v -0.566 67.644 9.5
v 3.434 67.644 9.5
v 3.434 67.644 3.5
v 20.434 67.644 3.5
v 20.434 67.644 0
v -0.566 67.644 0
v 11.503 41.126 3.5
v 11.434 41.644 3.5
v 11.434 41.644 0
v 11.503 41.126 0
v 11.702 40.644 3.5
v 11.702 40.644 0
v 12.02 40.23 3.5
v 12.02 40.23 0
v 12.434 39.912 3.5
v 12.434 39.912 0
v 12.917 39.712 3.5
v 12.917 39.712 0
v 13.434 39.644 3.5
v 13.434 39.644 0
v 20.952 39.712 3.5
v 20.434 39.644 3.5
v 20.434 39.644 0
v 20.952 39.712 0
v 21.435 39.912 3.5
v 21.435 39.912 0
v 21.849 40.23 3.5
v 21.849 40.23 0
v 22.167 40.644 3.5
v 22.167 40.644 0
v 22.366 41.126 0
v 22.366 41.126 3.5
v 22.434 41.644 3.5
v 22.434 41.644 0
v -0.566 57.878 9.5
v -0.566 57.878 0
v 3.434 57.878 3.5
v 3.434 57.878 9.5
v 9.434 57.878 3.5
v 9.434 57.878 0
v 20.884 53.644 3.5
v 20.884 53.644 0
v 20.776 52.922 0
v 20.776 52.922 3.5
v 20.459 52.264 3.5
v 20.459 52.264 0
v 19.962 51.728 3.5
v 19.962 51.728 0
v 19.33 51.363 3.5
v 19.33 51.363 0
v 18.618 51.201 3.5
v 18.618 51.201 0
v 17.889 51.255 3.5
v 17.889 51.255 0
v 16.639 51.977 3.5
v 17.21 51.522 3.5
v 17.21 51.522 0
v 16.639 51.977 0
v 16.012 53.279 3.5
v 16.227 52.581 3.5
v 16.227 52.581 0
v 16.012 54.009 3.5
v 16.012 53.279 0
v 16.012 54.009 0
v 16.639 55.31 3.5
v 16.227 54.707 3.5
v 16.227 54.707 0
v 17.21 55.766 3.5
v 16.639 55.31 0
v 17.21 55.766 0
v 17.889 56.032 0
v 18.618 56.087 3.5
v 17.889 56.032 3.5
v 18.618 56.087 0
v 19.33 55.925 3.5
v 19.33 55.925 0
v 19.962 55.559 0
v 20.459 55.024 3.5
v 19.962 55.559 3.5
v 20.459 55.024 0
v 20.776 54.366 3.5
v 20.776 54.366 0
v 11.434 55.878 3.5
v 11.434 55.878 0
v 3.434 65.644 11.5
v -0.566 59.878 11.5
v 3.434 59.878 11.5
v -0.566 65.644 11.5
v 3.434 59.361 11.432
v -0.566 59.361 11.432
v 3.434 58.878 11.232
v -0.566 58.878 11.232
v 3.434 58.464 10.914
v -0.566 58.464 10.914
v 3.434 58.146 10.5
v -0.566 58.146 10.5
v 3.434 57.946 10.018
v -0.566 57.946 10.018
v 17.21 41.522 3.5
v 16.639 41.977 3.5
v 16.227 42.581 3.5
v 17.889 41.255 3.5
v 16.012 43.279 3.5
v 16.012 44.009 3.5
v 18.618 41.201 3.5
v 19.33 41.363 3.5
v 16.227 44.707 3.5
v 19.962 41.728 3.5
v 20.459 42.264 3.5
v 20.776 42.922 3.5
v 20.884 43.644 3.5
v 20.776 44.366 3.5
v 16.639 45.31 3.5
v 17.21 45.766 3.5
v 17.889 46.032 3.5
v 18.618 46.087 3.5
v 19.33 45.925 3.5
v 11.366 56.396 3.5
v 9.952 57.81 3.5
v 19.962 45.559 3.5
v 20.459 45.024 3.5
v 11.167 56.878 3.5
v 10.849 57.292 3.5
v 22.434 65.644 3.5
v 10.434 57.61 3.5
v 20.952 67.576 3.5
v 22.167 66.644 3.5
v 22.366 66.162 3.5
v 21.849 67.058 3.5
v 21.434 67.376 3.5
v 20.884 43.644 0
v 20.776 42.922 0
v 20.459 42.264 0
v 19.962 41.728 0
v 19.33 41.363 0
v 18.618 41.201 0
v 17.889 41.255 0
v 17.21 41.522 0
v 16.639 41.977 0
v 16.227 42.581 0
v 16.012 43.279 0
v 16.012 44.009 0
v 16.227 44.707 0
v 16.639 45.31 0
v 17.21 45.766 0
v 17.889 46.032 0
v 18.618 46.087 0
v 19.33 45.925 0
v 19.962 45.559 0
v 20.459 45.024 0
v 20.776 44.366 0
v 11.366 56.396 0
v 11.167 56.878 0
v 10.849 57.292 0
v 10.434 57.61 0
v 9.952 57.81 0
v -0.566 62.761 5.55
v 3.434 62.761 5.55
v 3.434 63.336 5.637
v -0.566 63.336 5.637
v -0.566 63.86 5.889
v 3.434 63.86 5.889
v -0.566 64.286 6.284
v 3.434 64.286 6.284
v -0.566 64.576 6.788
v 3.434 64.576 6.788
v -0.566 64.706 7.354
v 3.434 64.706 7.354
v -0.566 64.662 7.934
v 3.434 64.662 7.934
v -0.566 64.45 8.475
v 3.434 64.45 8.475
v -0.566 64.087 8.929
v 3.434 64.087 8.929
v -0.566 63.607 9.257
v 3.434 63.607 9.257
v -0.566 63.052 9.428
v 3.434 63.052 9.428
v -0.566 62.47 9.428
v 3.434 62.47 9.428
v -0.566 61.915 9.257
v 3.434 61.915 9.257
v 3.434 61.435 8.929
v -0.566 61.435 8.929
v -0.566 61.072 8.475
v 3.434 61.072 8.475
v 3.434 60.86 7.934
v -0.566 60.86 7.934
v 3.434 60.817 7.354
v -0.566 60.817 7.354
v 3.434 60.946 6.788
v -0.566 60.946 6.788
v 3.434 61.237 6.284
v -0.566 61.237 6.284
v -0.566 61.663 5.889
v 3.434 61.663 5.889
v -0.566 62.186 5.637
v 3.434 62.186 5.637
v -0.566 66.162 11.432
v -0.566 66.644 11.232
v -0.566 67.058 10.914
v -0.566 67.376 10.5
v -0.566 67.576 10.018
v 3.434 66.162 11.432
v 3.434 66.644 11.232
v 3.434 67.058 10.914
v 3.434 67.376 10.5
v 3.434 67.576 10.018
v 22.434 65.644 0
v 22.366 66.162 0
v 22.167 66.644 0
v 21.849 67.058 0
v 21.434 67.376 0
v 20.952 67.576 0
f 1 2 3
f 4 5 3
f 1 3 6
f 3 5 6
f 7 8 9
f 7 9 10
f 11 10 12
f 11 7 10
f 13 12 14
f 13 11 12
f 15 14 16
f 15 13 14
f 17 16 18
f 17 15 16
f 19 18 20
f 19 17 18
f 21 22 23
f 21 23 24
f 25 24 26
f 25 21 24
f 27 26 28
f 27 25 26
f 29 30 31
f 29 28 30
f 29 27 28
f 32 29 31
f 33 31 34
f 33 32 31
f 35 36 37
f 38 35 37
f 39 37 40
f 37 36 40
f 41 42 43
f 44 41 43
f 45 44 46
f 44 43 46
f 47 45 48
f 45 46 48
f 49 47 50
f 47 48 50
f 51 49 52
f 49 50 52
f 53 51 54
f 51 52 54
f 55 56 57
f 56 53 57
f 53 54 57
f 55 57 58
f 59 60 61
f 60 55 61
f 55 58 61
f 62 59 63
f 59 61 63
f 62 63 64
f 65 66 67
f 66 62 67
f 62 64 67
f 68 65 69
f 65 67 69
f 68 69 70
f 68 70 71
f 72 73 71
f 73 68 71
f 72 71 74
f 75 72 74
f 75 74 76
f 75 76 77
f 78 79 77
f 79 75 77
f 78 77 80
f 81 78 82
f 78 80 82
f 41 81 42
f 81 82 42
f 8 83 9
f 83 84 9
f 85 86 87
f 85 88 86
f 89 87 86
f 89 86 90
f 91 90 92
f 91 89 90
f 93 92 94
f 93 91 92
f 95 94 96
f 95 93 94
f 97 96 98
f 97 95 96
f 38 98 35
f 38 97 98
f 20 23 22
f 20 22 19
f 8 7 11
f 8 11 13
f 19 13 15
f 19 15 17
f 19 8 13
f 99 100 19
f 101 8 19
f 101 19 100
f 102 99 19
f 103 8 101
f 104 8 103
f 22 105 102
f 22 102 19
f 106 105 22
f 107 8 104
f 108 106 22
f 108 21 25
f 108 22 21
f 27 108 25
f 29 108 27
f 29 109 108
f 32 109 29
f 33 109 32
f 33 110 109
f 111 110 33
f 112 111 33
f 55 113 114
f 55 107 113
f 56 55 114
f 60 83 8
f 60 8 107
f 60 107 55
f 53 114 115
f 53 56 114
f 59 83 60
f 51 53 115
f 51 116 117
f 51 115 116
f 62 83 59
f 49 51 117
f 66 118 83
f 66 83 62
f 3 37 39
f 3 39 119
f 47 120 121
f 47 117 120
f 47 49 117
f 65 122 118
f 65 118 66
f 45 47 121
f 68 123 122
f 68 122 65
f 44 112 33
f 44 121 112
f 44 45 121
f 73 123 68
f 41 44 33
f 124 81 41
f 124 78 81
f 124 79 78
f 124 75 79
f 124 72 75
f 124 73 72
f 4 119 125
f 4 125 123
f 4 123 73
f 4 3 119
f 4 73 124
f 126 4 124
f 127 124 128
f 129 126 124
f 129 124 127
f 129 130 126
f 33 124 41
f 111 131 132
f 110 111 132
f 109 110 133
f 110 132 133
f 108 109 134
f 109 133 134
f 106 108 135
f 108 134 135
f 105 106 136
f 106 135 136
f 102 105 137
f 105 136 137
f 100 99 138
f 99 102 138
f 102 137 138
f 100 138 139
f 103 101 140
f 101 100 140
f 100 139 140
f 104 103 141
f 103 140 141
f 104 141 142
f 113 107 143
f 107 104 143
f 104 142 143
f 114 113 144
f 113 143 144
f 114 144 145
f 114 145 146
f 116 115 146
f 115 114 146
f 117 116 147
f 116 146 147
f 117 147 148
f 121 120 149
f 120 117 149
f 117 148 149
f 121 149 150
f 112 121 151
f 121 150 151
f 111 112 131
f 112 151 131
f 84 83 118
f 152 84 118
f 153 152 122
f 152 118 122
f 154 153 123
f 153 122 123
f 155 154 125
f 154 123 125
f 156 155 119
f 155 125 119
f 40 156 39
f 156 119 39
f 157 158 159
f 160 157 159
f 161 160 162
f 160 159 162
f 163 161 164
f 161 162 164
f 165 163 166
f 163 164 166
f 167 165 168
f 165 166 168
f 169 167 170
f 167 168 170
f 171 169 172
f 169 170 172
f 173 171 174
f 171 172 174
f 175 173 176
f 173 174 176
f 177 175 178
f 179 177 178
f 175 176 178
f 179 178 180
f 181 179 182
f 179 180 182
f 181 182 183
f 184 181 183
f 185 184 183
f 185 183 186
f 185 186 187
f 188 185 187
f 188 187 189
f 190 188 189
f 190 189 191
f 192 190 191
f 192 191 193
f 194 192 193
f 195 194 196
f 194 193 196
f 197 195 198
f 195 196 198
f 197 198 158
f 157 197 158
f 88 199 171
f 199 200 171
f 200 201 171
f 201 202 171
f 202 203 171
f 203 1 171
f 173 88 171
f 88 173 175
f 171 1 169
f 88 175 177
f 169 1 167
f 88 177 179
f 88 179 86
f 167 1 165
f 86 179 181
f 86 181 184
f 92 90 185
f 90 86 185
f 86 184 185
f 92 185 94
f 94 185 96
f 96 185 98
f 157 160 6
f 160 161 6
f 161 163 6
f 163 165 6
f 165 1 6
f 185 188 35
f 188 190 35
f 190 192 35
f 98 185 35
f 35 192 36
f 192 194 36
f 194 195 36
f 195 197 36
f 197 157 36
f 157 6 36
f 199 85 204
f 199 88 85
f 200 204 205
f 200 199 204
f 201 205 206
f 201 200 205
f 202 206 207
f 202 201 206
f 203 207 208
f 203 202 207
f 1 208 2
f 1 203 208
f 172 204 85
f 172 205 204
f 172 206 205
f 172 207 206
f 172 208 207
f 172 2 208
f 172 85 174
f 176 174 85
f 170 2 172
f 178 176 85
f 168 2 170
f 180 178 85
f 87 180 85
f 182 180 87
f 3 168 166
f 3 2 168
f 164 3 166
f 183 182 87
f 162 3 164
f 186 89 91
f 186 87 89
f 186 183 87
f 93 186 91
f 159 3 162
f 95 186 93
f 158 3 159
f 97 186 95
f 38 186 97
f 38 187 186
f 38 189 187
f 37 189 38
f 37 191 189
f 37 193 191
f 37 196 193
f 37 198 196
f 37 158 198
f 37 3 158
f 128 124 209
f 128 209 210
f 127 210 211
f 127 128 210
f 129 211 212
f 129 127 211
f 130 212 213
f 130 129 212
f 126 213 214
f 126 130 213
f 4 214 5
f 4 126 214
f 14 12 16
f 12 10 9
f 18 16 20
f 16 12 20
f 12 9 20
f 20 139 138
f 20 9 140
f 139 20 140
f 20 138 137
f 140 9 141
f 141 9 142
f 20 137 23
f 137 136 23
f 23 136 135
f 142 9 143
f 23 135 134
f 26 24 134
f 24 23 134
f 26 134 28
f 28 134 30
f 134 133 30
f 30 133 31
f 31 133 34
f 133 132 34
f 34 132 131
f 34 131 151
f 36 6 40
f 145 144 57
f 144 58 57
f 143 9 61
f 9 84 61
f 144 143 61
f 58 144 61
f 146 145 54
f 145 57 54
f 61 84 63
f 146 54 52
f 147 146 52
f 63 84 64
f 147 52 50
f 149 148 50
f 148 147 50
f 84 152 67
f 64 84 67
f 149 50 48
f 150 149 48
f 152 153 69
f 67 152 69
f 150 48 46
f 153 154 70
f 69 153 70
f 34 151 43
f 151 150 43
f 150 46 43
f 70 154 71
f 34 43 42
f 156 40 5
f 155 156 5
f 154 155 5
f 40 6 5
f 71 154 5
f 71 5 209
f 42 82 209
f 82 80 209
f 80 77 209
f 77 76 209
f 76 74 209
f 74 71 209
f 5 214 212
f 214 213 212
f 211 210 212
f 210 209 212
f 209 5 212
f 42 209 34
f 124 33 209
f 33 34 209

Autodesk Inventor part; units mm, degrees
ref_plane "YZ Plane" through (0, 0, 0) normal (1, 0, 0) x (0, 1, 0)
ref_plane "XZ Plane" through (0, 0, 0) normal (0, 1, 0) x (-1, 0, 0)
ref_plane "XY Plane" through (0, 0, 0) normal (0, 0, 1) x (1, 0, 0)
ref_plane "Work Plane1" through (0, 0, 0) normal (0, 0, 1) x (1, 0, 0)
sketch "Sketch1" plane through (0, 0, 0) normal (0, 0, 1) x (1, 0, 0)
  circle A0 centre (-18.4345, 53.6439) radius 1.95 projected
  circle A1 centre (-18.4345, 43.6439) radius 1.95 projected
  circle A2 centre (-45.5, -14.5) radius 2.1 projected
  circle A3 centre (-14.5, -14.5) radius 2.1 projected
  circle A4 centre (-14.5, 16.5) radius 2.1 projected
  circle A5 centre (-45.5, 16.5) radius 2.1 projected
  circle A6 centre (-30, 1) radius 13 projected
  arc A7 (30, -41.6762) -> (-30, -41.6762) centre (0, -65) ccw projected
  line L0 (30, -41.6762) -> (30, -22) projected
  line L1 (30, -22) -> (10.1716, -22) projected
  line L2 (10.1716, -22) -> (7, -18.8284) projected
  line L3 (7, -18.8284) -> (7, 20.8284) projected
  line L4 (7, 20.8284) -> (10.1716, 24) projected
  line L5 (10.1716, 24) -> (26, 24) projected
  line L6 (26, 70.5) -> (26, 24) projected
  arc A8 (26, 70.5) -> (5.5, 91) centre (5.5, 70.5) ccw projected
  line L7 (-5.5, 91) -> (5.5, 91) projected
  arc A9 (-5.5, 91) -> (-26, 70.5) centre (-5.5, 70.5) ccw projected
  line L8 (-26, 24) -> (-26, 70.5) projected
  line L9 (-26, 24) -> (-49.8284, 24) projected
  line L10 (-49.8284, 24) -> (-53, 20.8284) projected
  line L11 (-53, 20.8284) -> (-53, -18.8284) projected
  line L12 (-53, -18.8284) -> (-49.8284, -22) projected
  line L13 (-49.8284, -22) -> (-30, -22) projected
  line L14 (-30, -22) -> (-30, -41.6762) projected
  circle A10 centre (18.4345, 43.6439) radius 1.95 projected
  circle A11 centre (18.4345, 53.6439) radius 1.95 projected
  line L15 (11.4345, 57.6439) -> (22.4345, 57.6439)
  line L16 (22.4345, 57.6439) -> (22.4345, 39.6439)
  line L17 (22.4345, 39.6439) -> (11.4345, 39.6439)
  line L18 (11.4345, 39.6439) -> (11.4345, 57.6439)
  circle A12 centre (18.4345, 53.6439) radius 2.45
  circle A13 centre (18.4345, 43.6439) radius 2.45
  line L19 (11.4345, 39.6439) -> (11.4345, 57.6439)
  line L20 (11.4345, 57.6439) -> (22.4345, 57.6439)
  line L21 (22.4345, 57.6439) -> (22.4345, 67.6439)
  line L22 (22.4345, 67.6439) -> (11.4345, 67.6439)
  line L23 (11.4345, 67.6439) -> (11.4345, 57.6439)
  line L24 (9.2719, 63.6439) -> (5.8371, 63.6439)
  line L25 (11.4345, 67.6439) -> (-0.5655, 67.6439)
  line L26 (-0.5655, 67.6439) -> (-0.5655, 57.8782)
  line L27 (-0.5655, 57.8782) -> (11.4345, 57.8782)
  line L28 (11.4345, 57.8782) -> (11.4345, 67.6439)
  point P0 (0, 0)
  point P1 (11.4345, 48.6439)
  dimension "d0" = 4
  dimension "d1" = 4
  dimension "d2" = 4
  dimension "d3" = 7
  dimension "d13" = 0.5
  dimension "d14" = 0.5
  dimension "d27" = 15
  dimension "d28" = 4
  dimension "d29" = 11
  dimension "d30" = 12
  dimension "d31" = 90
  dimension "d32" = 79.8782
  dimension "d33" = 61.6439
  dimension "d34" = 20.7281
  dimension "d35" = 24.1629
extrude "Extrusion1" add sketch "Sketch1" along normal blind 3.5 contours L23 L22 L21 L15 | L15 L16 L17 L18 | L27 L26 L25 L23
sketch "Sketch3" plane through (0, 0, 3.5) normal (0, 0, 1) x (1, 0, 0)
  circle A0 centre (18.4345, 43.6439) radius 2.45 projected
  circle A1 centre (18.4345, 53.6439) radius 2.45 projected
  line L0 (11.4345, 39.6439) -> (22.4345, 39.6439) projected
  line L1 (22.4345, 39.6439) -> (22.4345, 67.6439) projected
  line L2 (22.4345, 67.6439) -> (-0.5655, 67.6439) projected
  line L3 (-0.5655, 67.6439) -> (-0.5655, 57.8782) projected
  line L4 (-0.5655, 57.8782) -> (11.4345, 57.8782) projected
  line L5 (11.4345, 57.8782) -> (11.4345, 39.6439) projected
  line L6 (-0.5655, 67.6439) -> (3.4345, 67.6439)
  line L7 (3.4345, 67.6439) -> (3.4345, 57.8782)
  line L8 (3.4345, 57.8782) -> (-0.5655, 57.8782)
  line L9 (-0.5655, 57.8782) -> (-0.5655, 67.6439)
  point P0 (0, 0)
  dimension "d36" = 4
extrude "Extrusion3" add sketch "Sketch3" along normal blind 8 contours L4 L3 L2 L7
sketch "Sketch5" plane through (3.4345, 57.8782, 3.5) normal (1, 0, 0) x (0, 0, -1)
  line L0 (0, 9.7657) -> (0, 0) projected
  line L1 (0, 9.7657) -> (-8, 9.7657) projected
  line L2 (-8, 0) -> (-8, 9.7657) projected
  line L3 (0, 0) -> (-8, 0) projected
  line L4 (3.5, -18.2343) -> (3.5, 9.7657) projected
  line L5 (3.5, 9.7657) -> (0, 9.7657) projected
  line L6 (0, -18.2343) -> (0, 9.7657) projected
  line L7 (3.5, -18.2343) -> (0, -18.2343) projected
  circle A0 centre (-4, 4.8829) radius 1.95
  point P0 (3.5, -57.8782)
  dimension "d37" = 3.9
  dimension "d38" = 7.5
extrude "Extrusion5" cut sketch "Sketch5" against normal through all contours A0
fillet "Fillet1" radius 2 6 edges at (22.4345, 39.6439, 1.75) (22.4345, 67.6439, 1.75) (11.4345, 57.8782, 1.75) (11.4345, 39.6439, 1.75) (1.4345, 57.8782, 11.5) (1.4345, 67.6439, 11.5)
properties part number "midle-tensioner_3DPrint"
